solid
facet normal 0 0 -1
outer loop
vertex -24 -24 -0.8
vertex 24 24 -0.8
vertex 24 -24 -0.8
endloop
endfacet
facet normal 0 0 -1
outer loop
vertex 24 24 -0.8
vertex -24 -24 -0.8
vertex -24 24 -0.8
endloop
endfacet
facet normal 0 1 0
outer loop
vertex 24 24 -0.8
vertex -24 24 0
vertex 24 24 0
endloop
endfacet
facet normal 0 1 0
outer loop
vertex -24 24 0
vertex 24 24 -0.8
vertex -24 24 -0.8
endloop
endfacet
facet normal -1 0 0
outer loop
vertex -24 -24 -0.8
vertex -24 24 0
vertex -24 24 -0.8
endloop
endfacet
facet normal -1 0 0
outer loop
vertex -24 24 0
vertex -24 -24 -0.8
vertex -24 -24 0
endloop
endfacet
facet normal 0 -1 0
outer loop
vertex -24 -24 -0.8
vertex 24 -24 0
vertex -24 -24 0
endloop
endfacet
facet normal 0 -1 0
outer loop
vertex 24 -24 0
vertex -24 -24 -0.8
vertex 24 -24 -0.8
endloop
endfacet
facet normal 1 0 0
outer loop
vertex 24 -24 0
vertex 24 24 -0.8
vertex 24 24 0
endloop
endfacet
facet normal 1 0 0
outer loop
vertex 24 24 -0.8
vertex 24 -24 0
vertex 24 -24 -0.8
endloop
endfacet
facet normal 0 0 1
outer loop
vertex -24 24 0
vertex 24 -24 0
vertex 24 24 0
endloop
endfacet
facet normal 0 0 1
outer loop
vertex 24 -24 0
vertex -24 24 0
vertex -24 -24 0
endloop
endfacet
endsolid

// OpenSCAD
// file: ../p/box5.scad
use <../lib.scad>
function ldraw_lib__box5() = [
// 0 Box with 5 Faces and All Edges
// 0 Name: box5.dat
// 0 Author: James Jessiman
// 0 !LDRAW_ORG Primitive UPDATE 2012-01
// 0 !LICENSE Licensed under CC BY 2.0 and CC BY 4.0 : see CAreadme.txt
// 
// 0 BFC CERTIFY CCW
  [0,"BFC","CERTIFY"],
  [0,"BFC","CCW"],
// 
// 0 !HISTORY 2002-04-03 [sbliss] Modified for BFC compliance
// 0 !HISTORY 2002-04-25 [PTadmin] Official Update 2002-02
// 0 !HISTORY 2007-06-24 [PTadmin] Header formatted for Contributor Agreement
// 0 !HISTORY 2008-07-01 [PTadmin] Official Update 2008-01
// 0 !HISTORY 2012-02-16 [Philo] Changed to CCW
// 0 !HISTORY 2012-03-30 [PTadmin] Official Update 2012-01
// 
// 
// 2 24 1 1 1 -1 1 1
  [2,24,1,1,1,-1,1,1],
// 2 24 -1 1 1 -1 1 -1
  [2,24,-1,1,1,-1,1,-1],
// 2 24 -1 1 -1 1 1 -1
  [2,24,-1,1,-1,1,1,-1],
// 2 24 1 1 -1 1 1 1
  [2,24,1,1,-1,1,1,1],
// 2 24 1 0 1 -1 0 1
  [2,24,1,0,1,-1,0,1],
// 2 24 -1 0 1 -1 0 -1
  [2,24,-1,0,1,-1,0,-1],
// 2 24 -1 0 -1 1 0 -1
  [2,24,-1,0,-1,1,0,-1],
// 2 24 1 0 -1 1 0 1
  [2,24,1,0,-1,1,0,1],
// 2 24 1 0 1 1 1 1
  [2,24,1,0,1,1,1,1],
// 2 24 -1 0 1 -1 1 1
  [2,24,-1,0,1,-1,1,1],
// 2 24 1 0 -1 1 1 -1
  [2,24,1,0,-1,1,1,-1],
// 2 24 -1 0 -1 -1 1 -1
  [2,24,-1,0,-1,-1,1,-1],
// 4 16 -1 1 1 1 1 1 1 1 -1 -1 1 -1
  [4,16,-1,1,1,1,1,1,1,1,-1,-1,1,-1],
// 4 16 -1 1 1 -1 0 1 1 0 1 1 1 1
  [4,16,-1,1,1,-1,0,1,1,0,1,1,1,1],
// 4 16 -1 1 -1 -1 0 -1 -1 0 1 -1 1 1
  [4,16,-1,1,-1,-1,0,-1,-1,0,1,-1,1,1],
// 4 16 1 1 -1 1 0 -1 -1 0 -1 -1 1 -1
  [4,16,1,1,-1,1,0,-1,-1,0,-1,-1,1,-1],
// 4 16 1 1 1 1 0 1 1 0 -1 1 1 -1
  [4,16,1,1,1,1,0,1,1,0,-1,1,1,-1],
];
module ldraw_lib__box5(step=0, col=false, unit=2/5, alt=false, line=0.2, solid=!$preview)
    makepoly(ldraw_lib__box5(), step=step, col=col, unit=unit, alt=alt, line=line, solid=solid);
ldraw_lib__box5(line=0.2);
// file: 191766.scad
use <../lib.scad>
use <../p/box5.scad>
function ldraw_lib__191766() = [
// 0 Cardboard  6 x  6 Thick with Sharp Corners with White Top
// 0 Name: 191766.dat
// 0 Author: Steffen [Steffen]
// 0 !LDRAW_ORG Part UPDATE 2020-02
// 0 !LICENSE Licensed under CC BY 2.0 and CC BY 4.0 : see CAreadme.txt
// 
// 0 !HELP For Plate 8 x 8 with Grille
// 
// 0 BFC CERTIFY CCW
  [0,"BFC","CERTIFY"],
  [0,"BFC","CCW"],
// 
// 0 !CATEGORY Sheet Cardboard
// 0 !KEYWORDS Scala, set 4336
// 
// 0 !HISTORY 2019-09-09 [PTadmin] Official Update 2019-02
// 0 !HISTORY 2020-07-06 [Steffen] adjusted title and !HELP
// 0 !HISTORY 2020-07-08 [PTadmin] Renamed from u9253p01
// 0 !HISTORY 2020-09-05 [PTadmin] Official Update 2020-02
// 
// 
// 1 16 0 0 0 60 0 0 0 2 0 0 0 60 box5.dat
  [1,16,0,0,0,60,0,0,0,2,0,0,0,60, ldraw_lib__box5()],
// 4 15 -60 0 -60 60 0 -60 60 0 60 -60 0 60
  [4,15,-60,0,-60,60,0,-60,60,0,60,-60,0,60],
];
module ldraw_lib__191766(step=0, col=false, unit=2/5, alt=false, line=0.2, solid=!$preview)
    makepoly(ldraw_lib__191766(), step=step, col=col, unit=unit, alt=alt, line=line, solid=solid);
ldraw_lib__191766(line=0.2);
// main file
use <../lib.scad>
use <191766.scad>
function ldraw_lib__u9253p01() = [
// 0 ~Moved to 191766
// 0 Name: u9253p01.dat
// 0 Author: [PTadmin]
// 0 !LDRAW_ORG Part UPDATE 2020-02
// 0 !LICENSE Licensed under CC BY 4.0 : see CAreadme.txt
// 
// 0 BFC CERTIFY CCW
  [0,"BFC","CERTIFY"],
  [0,"BFC","CCW"],
// 
// 0 !HISTORY 2020-09-05 [PTadmin] Official Update 2020-02
// 
// 
// 0 // Cardboard 6 x 6 Thick with Sharp Corners with White Top
// 1 16 0 0 0 1 0 0 0 1 0 0 0 1 191766.dat
  [1,16,0,0,0,1,0,0,0,1,0,0,0,1, ldraw_lib__191766()],
];
module ldraw_lib__u9253p01(step=0, col=false, unit=2/5, alt=false, line=0.2, solid=!$preview)
    makepoly(ldraw_lib__u9253p01(), step=step, col=col, unit=unit, alt=alt, line=line, solid=solid);
ldraw_lib__u9253p01(line=0.2);
